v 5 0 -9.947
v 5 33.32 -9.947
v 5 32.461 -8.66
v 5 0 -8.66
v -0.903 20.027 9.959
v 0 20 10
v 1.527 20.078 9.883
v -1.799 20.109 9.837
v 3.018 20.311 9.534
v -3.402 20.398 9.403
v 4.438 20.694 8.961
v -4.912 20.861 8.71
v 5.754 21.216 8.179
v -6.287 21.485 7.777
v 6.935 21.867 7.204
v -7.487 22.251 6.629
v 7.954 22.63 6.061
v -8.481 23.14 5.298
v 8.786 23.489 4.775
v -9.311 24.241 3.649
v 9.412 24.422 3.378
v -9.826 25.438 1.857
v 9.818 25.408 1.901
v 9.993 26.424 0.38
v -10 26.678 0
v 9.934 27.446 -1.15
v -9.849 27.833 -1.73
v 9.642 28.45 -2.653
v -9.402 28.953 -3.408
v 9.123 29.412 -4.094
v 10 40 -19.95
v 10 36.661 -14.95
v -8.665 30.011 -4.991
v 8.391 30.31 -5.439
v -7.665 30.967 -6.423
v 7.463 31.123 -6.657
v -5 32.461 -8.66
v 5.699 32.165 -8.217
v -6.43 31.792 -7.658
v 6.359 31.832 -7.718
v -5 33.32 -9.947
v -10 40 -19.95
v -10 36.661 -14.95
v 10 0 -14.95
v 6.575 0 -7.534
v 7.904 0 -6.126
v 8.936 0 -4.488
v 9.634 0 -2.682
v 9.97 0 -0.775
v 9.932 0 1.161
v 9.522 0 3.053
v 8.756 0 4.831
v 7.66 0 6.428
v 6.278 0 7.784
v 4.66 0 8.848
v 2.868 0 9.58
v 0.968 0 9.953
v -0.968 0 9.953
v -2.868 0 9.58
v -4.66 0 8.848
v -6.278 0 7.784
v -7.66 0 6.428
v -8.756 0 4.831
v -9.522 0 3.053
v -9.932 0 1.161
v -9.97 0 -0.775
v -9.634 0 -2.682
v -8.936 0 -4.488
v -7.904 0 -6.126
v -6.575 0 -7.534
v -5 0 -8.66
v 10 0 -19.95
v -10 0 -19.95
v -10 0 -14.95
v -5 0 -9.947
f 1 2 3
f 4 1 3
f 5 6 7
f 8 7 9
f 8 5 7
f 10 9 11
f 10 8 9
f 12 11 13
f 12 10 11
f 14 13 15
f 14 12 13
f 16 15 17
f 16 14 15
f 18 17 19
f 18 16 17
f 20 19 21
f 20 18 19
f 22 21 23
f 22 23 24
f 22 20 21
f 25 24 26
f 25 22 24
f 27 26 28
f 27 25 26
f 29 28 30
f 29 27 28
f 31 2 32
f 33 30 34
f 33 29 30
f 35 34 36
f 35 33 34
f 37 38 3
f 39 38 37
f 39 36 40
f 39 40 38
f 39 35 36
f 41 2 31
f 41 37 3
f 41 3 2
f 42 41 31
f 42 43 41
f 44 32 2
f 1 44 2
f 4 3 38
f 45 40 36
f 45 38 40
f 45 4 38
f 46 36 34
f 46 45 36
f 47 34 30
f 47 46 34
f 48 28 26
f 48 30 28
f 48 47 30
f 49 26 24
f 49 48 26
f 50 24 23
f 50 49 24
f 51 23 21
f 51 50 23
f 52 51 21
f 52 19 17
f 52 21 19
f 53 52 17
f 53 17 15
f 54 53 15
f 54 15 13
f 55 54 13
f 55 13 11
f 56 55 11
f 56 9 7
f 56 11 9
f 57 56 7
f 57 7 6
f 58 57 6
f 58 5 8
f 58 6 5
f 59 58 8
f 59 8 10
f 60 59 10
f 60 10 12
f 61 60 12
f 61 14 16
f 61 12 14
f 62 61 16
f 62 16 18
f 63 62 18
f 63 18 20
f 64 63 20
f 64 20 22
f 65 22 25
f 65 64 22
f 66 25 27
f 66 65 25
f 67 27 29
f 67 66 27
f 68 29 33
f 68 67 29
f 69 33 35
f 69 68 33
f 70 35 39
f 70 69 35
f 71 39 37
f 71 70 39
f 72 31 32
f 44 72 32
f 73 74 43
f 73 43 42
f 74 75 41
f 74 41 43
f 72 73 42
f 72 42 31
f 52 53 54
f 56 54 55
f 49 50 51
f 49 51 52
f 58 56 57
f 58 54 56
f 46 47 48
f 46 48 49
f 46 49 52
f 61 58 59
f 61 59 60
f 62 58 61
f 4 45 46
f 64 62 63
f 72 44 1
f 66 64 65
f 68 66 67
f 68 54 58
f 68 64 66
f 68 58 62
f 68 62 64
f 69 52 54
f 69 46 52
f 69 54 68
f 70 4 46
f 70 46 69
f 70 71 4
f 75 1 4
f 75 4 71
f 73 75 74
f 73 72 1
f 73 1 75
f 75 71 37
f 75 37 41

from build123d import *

# Parameters (mm, degrees)
EXTRUDE_1_DEPTH     = 40
CUT_EXTRUDE_1_DEPTH = 40


with BuildPart() as part:
    # 草图1 → 凸台-拉伸1 (new body)
    with BuildSketch(Plane(origin=(0, 0, 0), x_dir=(1, 0, 0), z_dir=(0, 1, 0))):
        with BuildLine():
            Line((0, 19.95), (10, 19.95))
            Line((10, 19.95), (10, 14.95))
            Line((10, 14.95), (5, 9.947267065))
            Line((5, 9.947267065), (5, 8.660254038))
            ThreePointArc((5, 8.660254038), (0, -10), (-5, 8.660254038))
            Line((-5, 8.660254038), (-5, 9.947267065))
            Line((-5, 9.947267065), (-10, 14.95))
            Line((-10, 14.95), (-10, 19.95))
            Line((-10, 19.95), (0, 19.95))
        make_face()
    extrude(amount=EXTRUDE_1_DEPTH)

    # 草图3 → 切除-拉伸1 (cut)
    with BuildSketch(Plane.ZY.offset(10)):
        Polygon((10, 20), (-19.95, 40), (10, 40), align=None)
    extrude(amount=-CUT_EXTRUDE_1_DEPTH, mode=Mode.SUBTRACT)


solid = part.part
